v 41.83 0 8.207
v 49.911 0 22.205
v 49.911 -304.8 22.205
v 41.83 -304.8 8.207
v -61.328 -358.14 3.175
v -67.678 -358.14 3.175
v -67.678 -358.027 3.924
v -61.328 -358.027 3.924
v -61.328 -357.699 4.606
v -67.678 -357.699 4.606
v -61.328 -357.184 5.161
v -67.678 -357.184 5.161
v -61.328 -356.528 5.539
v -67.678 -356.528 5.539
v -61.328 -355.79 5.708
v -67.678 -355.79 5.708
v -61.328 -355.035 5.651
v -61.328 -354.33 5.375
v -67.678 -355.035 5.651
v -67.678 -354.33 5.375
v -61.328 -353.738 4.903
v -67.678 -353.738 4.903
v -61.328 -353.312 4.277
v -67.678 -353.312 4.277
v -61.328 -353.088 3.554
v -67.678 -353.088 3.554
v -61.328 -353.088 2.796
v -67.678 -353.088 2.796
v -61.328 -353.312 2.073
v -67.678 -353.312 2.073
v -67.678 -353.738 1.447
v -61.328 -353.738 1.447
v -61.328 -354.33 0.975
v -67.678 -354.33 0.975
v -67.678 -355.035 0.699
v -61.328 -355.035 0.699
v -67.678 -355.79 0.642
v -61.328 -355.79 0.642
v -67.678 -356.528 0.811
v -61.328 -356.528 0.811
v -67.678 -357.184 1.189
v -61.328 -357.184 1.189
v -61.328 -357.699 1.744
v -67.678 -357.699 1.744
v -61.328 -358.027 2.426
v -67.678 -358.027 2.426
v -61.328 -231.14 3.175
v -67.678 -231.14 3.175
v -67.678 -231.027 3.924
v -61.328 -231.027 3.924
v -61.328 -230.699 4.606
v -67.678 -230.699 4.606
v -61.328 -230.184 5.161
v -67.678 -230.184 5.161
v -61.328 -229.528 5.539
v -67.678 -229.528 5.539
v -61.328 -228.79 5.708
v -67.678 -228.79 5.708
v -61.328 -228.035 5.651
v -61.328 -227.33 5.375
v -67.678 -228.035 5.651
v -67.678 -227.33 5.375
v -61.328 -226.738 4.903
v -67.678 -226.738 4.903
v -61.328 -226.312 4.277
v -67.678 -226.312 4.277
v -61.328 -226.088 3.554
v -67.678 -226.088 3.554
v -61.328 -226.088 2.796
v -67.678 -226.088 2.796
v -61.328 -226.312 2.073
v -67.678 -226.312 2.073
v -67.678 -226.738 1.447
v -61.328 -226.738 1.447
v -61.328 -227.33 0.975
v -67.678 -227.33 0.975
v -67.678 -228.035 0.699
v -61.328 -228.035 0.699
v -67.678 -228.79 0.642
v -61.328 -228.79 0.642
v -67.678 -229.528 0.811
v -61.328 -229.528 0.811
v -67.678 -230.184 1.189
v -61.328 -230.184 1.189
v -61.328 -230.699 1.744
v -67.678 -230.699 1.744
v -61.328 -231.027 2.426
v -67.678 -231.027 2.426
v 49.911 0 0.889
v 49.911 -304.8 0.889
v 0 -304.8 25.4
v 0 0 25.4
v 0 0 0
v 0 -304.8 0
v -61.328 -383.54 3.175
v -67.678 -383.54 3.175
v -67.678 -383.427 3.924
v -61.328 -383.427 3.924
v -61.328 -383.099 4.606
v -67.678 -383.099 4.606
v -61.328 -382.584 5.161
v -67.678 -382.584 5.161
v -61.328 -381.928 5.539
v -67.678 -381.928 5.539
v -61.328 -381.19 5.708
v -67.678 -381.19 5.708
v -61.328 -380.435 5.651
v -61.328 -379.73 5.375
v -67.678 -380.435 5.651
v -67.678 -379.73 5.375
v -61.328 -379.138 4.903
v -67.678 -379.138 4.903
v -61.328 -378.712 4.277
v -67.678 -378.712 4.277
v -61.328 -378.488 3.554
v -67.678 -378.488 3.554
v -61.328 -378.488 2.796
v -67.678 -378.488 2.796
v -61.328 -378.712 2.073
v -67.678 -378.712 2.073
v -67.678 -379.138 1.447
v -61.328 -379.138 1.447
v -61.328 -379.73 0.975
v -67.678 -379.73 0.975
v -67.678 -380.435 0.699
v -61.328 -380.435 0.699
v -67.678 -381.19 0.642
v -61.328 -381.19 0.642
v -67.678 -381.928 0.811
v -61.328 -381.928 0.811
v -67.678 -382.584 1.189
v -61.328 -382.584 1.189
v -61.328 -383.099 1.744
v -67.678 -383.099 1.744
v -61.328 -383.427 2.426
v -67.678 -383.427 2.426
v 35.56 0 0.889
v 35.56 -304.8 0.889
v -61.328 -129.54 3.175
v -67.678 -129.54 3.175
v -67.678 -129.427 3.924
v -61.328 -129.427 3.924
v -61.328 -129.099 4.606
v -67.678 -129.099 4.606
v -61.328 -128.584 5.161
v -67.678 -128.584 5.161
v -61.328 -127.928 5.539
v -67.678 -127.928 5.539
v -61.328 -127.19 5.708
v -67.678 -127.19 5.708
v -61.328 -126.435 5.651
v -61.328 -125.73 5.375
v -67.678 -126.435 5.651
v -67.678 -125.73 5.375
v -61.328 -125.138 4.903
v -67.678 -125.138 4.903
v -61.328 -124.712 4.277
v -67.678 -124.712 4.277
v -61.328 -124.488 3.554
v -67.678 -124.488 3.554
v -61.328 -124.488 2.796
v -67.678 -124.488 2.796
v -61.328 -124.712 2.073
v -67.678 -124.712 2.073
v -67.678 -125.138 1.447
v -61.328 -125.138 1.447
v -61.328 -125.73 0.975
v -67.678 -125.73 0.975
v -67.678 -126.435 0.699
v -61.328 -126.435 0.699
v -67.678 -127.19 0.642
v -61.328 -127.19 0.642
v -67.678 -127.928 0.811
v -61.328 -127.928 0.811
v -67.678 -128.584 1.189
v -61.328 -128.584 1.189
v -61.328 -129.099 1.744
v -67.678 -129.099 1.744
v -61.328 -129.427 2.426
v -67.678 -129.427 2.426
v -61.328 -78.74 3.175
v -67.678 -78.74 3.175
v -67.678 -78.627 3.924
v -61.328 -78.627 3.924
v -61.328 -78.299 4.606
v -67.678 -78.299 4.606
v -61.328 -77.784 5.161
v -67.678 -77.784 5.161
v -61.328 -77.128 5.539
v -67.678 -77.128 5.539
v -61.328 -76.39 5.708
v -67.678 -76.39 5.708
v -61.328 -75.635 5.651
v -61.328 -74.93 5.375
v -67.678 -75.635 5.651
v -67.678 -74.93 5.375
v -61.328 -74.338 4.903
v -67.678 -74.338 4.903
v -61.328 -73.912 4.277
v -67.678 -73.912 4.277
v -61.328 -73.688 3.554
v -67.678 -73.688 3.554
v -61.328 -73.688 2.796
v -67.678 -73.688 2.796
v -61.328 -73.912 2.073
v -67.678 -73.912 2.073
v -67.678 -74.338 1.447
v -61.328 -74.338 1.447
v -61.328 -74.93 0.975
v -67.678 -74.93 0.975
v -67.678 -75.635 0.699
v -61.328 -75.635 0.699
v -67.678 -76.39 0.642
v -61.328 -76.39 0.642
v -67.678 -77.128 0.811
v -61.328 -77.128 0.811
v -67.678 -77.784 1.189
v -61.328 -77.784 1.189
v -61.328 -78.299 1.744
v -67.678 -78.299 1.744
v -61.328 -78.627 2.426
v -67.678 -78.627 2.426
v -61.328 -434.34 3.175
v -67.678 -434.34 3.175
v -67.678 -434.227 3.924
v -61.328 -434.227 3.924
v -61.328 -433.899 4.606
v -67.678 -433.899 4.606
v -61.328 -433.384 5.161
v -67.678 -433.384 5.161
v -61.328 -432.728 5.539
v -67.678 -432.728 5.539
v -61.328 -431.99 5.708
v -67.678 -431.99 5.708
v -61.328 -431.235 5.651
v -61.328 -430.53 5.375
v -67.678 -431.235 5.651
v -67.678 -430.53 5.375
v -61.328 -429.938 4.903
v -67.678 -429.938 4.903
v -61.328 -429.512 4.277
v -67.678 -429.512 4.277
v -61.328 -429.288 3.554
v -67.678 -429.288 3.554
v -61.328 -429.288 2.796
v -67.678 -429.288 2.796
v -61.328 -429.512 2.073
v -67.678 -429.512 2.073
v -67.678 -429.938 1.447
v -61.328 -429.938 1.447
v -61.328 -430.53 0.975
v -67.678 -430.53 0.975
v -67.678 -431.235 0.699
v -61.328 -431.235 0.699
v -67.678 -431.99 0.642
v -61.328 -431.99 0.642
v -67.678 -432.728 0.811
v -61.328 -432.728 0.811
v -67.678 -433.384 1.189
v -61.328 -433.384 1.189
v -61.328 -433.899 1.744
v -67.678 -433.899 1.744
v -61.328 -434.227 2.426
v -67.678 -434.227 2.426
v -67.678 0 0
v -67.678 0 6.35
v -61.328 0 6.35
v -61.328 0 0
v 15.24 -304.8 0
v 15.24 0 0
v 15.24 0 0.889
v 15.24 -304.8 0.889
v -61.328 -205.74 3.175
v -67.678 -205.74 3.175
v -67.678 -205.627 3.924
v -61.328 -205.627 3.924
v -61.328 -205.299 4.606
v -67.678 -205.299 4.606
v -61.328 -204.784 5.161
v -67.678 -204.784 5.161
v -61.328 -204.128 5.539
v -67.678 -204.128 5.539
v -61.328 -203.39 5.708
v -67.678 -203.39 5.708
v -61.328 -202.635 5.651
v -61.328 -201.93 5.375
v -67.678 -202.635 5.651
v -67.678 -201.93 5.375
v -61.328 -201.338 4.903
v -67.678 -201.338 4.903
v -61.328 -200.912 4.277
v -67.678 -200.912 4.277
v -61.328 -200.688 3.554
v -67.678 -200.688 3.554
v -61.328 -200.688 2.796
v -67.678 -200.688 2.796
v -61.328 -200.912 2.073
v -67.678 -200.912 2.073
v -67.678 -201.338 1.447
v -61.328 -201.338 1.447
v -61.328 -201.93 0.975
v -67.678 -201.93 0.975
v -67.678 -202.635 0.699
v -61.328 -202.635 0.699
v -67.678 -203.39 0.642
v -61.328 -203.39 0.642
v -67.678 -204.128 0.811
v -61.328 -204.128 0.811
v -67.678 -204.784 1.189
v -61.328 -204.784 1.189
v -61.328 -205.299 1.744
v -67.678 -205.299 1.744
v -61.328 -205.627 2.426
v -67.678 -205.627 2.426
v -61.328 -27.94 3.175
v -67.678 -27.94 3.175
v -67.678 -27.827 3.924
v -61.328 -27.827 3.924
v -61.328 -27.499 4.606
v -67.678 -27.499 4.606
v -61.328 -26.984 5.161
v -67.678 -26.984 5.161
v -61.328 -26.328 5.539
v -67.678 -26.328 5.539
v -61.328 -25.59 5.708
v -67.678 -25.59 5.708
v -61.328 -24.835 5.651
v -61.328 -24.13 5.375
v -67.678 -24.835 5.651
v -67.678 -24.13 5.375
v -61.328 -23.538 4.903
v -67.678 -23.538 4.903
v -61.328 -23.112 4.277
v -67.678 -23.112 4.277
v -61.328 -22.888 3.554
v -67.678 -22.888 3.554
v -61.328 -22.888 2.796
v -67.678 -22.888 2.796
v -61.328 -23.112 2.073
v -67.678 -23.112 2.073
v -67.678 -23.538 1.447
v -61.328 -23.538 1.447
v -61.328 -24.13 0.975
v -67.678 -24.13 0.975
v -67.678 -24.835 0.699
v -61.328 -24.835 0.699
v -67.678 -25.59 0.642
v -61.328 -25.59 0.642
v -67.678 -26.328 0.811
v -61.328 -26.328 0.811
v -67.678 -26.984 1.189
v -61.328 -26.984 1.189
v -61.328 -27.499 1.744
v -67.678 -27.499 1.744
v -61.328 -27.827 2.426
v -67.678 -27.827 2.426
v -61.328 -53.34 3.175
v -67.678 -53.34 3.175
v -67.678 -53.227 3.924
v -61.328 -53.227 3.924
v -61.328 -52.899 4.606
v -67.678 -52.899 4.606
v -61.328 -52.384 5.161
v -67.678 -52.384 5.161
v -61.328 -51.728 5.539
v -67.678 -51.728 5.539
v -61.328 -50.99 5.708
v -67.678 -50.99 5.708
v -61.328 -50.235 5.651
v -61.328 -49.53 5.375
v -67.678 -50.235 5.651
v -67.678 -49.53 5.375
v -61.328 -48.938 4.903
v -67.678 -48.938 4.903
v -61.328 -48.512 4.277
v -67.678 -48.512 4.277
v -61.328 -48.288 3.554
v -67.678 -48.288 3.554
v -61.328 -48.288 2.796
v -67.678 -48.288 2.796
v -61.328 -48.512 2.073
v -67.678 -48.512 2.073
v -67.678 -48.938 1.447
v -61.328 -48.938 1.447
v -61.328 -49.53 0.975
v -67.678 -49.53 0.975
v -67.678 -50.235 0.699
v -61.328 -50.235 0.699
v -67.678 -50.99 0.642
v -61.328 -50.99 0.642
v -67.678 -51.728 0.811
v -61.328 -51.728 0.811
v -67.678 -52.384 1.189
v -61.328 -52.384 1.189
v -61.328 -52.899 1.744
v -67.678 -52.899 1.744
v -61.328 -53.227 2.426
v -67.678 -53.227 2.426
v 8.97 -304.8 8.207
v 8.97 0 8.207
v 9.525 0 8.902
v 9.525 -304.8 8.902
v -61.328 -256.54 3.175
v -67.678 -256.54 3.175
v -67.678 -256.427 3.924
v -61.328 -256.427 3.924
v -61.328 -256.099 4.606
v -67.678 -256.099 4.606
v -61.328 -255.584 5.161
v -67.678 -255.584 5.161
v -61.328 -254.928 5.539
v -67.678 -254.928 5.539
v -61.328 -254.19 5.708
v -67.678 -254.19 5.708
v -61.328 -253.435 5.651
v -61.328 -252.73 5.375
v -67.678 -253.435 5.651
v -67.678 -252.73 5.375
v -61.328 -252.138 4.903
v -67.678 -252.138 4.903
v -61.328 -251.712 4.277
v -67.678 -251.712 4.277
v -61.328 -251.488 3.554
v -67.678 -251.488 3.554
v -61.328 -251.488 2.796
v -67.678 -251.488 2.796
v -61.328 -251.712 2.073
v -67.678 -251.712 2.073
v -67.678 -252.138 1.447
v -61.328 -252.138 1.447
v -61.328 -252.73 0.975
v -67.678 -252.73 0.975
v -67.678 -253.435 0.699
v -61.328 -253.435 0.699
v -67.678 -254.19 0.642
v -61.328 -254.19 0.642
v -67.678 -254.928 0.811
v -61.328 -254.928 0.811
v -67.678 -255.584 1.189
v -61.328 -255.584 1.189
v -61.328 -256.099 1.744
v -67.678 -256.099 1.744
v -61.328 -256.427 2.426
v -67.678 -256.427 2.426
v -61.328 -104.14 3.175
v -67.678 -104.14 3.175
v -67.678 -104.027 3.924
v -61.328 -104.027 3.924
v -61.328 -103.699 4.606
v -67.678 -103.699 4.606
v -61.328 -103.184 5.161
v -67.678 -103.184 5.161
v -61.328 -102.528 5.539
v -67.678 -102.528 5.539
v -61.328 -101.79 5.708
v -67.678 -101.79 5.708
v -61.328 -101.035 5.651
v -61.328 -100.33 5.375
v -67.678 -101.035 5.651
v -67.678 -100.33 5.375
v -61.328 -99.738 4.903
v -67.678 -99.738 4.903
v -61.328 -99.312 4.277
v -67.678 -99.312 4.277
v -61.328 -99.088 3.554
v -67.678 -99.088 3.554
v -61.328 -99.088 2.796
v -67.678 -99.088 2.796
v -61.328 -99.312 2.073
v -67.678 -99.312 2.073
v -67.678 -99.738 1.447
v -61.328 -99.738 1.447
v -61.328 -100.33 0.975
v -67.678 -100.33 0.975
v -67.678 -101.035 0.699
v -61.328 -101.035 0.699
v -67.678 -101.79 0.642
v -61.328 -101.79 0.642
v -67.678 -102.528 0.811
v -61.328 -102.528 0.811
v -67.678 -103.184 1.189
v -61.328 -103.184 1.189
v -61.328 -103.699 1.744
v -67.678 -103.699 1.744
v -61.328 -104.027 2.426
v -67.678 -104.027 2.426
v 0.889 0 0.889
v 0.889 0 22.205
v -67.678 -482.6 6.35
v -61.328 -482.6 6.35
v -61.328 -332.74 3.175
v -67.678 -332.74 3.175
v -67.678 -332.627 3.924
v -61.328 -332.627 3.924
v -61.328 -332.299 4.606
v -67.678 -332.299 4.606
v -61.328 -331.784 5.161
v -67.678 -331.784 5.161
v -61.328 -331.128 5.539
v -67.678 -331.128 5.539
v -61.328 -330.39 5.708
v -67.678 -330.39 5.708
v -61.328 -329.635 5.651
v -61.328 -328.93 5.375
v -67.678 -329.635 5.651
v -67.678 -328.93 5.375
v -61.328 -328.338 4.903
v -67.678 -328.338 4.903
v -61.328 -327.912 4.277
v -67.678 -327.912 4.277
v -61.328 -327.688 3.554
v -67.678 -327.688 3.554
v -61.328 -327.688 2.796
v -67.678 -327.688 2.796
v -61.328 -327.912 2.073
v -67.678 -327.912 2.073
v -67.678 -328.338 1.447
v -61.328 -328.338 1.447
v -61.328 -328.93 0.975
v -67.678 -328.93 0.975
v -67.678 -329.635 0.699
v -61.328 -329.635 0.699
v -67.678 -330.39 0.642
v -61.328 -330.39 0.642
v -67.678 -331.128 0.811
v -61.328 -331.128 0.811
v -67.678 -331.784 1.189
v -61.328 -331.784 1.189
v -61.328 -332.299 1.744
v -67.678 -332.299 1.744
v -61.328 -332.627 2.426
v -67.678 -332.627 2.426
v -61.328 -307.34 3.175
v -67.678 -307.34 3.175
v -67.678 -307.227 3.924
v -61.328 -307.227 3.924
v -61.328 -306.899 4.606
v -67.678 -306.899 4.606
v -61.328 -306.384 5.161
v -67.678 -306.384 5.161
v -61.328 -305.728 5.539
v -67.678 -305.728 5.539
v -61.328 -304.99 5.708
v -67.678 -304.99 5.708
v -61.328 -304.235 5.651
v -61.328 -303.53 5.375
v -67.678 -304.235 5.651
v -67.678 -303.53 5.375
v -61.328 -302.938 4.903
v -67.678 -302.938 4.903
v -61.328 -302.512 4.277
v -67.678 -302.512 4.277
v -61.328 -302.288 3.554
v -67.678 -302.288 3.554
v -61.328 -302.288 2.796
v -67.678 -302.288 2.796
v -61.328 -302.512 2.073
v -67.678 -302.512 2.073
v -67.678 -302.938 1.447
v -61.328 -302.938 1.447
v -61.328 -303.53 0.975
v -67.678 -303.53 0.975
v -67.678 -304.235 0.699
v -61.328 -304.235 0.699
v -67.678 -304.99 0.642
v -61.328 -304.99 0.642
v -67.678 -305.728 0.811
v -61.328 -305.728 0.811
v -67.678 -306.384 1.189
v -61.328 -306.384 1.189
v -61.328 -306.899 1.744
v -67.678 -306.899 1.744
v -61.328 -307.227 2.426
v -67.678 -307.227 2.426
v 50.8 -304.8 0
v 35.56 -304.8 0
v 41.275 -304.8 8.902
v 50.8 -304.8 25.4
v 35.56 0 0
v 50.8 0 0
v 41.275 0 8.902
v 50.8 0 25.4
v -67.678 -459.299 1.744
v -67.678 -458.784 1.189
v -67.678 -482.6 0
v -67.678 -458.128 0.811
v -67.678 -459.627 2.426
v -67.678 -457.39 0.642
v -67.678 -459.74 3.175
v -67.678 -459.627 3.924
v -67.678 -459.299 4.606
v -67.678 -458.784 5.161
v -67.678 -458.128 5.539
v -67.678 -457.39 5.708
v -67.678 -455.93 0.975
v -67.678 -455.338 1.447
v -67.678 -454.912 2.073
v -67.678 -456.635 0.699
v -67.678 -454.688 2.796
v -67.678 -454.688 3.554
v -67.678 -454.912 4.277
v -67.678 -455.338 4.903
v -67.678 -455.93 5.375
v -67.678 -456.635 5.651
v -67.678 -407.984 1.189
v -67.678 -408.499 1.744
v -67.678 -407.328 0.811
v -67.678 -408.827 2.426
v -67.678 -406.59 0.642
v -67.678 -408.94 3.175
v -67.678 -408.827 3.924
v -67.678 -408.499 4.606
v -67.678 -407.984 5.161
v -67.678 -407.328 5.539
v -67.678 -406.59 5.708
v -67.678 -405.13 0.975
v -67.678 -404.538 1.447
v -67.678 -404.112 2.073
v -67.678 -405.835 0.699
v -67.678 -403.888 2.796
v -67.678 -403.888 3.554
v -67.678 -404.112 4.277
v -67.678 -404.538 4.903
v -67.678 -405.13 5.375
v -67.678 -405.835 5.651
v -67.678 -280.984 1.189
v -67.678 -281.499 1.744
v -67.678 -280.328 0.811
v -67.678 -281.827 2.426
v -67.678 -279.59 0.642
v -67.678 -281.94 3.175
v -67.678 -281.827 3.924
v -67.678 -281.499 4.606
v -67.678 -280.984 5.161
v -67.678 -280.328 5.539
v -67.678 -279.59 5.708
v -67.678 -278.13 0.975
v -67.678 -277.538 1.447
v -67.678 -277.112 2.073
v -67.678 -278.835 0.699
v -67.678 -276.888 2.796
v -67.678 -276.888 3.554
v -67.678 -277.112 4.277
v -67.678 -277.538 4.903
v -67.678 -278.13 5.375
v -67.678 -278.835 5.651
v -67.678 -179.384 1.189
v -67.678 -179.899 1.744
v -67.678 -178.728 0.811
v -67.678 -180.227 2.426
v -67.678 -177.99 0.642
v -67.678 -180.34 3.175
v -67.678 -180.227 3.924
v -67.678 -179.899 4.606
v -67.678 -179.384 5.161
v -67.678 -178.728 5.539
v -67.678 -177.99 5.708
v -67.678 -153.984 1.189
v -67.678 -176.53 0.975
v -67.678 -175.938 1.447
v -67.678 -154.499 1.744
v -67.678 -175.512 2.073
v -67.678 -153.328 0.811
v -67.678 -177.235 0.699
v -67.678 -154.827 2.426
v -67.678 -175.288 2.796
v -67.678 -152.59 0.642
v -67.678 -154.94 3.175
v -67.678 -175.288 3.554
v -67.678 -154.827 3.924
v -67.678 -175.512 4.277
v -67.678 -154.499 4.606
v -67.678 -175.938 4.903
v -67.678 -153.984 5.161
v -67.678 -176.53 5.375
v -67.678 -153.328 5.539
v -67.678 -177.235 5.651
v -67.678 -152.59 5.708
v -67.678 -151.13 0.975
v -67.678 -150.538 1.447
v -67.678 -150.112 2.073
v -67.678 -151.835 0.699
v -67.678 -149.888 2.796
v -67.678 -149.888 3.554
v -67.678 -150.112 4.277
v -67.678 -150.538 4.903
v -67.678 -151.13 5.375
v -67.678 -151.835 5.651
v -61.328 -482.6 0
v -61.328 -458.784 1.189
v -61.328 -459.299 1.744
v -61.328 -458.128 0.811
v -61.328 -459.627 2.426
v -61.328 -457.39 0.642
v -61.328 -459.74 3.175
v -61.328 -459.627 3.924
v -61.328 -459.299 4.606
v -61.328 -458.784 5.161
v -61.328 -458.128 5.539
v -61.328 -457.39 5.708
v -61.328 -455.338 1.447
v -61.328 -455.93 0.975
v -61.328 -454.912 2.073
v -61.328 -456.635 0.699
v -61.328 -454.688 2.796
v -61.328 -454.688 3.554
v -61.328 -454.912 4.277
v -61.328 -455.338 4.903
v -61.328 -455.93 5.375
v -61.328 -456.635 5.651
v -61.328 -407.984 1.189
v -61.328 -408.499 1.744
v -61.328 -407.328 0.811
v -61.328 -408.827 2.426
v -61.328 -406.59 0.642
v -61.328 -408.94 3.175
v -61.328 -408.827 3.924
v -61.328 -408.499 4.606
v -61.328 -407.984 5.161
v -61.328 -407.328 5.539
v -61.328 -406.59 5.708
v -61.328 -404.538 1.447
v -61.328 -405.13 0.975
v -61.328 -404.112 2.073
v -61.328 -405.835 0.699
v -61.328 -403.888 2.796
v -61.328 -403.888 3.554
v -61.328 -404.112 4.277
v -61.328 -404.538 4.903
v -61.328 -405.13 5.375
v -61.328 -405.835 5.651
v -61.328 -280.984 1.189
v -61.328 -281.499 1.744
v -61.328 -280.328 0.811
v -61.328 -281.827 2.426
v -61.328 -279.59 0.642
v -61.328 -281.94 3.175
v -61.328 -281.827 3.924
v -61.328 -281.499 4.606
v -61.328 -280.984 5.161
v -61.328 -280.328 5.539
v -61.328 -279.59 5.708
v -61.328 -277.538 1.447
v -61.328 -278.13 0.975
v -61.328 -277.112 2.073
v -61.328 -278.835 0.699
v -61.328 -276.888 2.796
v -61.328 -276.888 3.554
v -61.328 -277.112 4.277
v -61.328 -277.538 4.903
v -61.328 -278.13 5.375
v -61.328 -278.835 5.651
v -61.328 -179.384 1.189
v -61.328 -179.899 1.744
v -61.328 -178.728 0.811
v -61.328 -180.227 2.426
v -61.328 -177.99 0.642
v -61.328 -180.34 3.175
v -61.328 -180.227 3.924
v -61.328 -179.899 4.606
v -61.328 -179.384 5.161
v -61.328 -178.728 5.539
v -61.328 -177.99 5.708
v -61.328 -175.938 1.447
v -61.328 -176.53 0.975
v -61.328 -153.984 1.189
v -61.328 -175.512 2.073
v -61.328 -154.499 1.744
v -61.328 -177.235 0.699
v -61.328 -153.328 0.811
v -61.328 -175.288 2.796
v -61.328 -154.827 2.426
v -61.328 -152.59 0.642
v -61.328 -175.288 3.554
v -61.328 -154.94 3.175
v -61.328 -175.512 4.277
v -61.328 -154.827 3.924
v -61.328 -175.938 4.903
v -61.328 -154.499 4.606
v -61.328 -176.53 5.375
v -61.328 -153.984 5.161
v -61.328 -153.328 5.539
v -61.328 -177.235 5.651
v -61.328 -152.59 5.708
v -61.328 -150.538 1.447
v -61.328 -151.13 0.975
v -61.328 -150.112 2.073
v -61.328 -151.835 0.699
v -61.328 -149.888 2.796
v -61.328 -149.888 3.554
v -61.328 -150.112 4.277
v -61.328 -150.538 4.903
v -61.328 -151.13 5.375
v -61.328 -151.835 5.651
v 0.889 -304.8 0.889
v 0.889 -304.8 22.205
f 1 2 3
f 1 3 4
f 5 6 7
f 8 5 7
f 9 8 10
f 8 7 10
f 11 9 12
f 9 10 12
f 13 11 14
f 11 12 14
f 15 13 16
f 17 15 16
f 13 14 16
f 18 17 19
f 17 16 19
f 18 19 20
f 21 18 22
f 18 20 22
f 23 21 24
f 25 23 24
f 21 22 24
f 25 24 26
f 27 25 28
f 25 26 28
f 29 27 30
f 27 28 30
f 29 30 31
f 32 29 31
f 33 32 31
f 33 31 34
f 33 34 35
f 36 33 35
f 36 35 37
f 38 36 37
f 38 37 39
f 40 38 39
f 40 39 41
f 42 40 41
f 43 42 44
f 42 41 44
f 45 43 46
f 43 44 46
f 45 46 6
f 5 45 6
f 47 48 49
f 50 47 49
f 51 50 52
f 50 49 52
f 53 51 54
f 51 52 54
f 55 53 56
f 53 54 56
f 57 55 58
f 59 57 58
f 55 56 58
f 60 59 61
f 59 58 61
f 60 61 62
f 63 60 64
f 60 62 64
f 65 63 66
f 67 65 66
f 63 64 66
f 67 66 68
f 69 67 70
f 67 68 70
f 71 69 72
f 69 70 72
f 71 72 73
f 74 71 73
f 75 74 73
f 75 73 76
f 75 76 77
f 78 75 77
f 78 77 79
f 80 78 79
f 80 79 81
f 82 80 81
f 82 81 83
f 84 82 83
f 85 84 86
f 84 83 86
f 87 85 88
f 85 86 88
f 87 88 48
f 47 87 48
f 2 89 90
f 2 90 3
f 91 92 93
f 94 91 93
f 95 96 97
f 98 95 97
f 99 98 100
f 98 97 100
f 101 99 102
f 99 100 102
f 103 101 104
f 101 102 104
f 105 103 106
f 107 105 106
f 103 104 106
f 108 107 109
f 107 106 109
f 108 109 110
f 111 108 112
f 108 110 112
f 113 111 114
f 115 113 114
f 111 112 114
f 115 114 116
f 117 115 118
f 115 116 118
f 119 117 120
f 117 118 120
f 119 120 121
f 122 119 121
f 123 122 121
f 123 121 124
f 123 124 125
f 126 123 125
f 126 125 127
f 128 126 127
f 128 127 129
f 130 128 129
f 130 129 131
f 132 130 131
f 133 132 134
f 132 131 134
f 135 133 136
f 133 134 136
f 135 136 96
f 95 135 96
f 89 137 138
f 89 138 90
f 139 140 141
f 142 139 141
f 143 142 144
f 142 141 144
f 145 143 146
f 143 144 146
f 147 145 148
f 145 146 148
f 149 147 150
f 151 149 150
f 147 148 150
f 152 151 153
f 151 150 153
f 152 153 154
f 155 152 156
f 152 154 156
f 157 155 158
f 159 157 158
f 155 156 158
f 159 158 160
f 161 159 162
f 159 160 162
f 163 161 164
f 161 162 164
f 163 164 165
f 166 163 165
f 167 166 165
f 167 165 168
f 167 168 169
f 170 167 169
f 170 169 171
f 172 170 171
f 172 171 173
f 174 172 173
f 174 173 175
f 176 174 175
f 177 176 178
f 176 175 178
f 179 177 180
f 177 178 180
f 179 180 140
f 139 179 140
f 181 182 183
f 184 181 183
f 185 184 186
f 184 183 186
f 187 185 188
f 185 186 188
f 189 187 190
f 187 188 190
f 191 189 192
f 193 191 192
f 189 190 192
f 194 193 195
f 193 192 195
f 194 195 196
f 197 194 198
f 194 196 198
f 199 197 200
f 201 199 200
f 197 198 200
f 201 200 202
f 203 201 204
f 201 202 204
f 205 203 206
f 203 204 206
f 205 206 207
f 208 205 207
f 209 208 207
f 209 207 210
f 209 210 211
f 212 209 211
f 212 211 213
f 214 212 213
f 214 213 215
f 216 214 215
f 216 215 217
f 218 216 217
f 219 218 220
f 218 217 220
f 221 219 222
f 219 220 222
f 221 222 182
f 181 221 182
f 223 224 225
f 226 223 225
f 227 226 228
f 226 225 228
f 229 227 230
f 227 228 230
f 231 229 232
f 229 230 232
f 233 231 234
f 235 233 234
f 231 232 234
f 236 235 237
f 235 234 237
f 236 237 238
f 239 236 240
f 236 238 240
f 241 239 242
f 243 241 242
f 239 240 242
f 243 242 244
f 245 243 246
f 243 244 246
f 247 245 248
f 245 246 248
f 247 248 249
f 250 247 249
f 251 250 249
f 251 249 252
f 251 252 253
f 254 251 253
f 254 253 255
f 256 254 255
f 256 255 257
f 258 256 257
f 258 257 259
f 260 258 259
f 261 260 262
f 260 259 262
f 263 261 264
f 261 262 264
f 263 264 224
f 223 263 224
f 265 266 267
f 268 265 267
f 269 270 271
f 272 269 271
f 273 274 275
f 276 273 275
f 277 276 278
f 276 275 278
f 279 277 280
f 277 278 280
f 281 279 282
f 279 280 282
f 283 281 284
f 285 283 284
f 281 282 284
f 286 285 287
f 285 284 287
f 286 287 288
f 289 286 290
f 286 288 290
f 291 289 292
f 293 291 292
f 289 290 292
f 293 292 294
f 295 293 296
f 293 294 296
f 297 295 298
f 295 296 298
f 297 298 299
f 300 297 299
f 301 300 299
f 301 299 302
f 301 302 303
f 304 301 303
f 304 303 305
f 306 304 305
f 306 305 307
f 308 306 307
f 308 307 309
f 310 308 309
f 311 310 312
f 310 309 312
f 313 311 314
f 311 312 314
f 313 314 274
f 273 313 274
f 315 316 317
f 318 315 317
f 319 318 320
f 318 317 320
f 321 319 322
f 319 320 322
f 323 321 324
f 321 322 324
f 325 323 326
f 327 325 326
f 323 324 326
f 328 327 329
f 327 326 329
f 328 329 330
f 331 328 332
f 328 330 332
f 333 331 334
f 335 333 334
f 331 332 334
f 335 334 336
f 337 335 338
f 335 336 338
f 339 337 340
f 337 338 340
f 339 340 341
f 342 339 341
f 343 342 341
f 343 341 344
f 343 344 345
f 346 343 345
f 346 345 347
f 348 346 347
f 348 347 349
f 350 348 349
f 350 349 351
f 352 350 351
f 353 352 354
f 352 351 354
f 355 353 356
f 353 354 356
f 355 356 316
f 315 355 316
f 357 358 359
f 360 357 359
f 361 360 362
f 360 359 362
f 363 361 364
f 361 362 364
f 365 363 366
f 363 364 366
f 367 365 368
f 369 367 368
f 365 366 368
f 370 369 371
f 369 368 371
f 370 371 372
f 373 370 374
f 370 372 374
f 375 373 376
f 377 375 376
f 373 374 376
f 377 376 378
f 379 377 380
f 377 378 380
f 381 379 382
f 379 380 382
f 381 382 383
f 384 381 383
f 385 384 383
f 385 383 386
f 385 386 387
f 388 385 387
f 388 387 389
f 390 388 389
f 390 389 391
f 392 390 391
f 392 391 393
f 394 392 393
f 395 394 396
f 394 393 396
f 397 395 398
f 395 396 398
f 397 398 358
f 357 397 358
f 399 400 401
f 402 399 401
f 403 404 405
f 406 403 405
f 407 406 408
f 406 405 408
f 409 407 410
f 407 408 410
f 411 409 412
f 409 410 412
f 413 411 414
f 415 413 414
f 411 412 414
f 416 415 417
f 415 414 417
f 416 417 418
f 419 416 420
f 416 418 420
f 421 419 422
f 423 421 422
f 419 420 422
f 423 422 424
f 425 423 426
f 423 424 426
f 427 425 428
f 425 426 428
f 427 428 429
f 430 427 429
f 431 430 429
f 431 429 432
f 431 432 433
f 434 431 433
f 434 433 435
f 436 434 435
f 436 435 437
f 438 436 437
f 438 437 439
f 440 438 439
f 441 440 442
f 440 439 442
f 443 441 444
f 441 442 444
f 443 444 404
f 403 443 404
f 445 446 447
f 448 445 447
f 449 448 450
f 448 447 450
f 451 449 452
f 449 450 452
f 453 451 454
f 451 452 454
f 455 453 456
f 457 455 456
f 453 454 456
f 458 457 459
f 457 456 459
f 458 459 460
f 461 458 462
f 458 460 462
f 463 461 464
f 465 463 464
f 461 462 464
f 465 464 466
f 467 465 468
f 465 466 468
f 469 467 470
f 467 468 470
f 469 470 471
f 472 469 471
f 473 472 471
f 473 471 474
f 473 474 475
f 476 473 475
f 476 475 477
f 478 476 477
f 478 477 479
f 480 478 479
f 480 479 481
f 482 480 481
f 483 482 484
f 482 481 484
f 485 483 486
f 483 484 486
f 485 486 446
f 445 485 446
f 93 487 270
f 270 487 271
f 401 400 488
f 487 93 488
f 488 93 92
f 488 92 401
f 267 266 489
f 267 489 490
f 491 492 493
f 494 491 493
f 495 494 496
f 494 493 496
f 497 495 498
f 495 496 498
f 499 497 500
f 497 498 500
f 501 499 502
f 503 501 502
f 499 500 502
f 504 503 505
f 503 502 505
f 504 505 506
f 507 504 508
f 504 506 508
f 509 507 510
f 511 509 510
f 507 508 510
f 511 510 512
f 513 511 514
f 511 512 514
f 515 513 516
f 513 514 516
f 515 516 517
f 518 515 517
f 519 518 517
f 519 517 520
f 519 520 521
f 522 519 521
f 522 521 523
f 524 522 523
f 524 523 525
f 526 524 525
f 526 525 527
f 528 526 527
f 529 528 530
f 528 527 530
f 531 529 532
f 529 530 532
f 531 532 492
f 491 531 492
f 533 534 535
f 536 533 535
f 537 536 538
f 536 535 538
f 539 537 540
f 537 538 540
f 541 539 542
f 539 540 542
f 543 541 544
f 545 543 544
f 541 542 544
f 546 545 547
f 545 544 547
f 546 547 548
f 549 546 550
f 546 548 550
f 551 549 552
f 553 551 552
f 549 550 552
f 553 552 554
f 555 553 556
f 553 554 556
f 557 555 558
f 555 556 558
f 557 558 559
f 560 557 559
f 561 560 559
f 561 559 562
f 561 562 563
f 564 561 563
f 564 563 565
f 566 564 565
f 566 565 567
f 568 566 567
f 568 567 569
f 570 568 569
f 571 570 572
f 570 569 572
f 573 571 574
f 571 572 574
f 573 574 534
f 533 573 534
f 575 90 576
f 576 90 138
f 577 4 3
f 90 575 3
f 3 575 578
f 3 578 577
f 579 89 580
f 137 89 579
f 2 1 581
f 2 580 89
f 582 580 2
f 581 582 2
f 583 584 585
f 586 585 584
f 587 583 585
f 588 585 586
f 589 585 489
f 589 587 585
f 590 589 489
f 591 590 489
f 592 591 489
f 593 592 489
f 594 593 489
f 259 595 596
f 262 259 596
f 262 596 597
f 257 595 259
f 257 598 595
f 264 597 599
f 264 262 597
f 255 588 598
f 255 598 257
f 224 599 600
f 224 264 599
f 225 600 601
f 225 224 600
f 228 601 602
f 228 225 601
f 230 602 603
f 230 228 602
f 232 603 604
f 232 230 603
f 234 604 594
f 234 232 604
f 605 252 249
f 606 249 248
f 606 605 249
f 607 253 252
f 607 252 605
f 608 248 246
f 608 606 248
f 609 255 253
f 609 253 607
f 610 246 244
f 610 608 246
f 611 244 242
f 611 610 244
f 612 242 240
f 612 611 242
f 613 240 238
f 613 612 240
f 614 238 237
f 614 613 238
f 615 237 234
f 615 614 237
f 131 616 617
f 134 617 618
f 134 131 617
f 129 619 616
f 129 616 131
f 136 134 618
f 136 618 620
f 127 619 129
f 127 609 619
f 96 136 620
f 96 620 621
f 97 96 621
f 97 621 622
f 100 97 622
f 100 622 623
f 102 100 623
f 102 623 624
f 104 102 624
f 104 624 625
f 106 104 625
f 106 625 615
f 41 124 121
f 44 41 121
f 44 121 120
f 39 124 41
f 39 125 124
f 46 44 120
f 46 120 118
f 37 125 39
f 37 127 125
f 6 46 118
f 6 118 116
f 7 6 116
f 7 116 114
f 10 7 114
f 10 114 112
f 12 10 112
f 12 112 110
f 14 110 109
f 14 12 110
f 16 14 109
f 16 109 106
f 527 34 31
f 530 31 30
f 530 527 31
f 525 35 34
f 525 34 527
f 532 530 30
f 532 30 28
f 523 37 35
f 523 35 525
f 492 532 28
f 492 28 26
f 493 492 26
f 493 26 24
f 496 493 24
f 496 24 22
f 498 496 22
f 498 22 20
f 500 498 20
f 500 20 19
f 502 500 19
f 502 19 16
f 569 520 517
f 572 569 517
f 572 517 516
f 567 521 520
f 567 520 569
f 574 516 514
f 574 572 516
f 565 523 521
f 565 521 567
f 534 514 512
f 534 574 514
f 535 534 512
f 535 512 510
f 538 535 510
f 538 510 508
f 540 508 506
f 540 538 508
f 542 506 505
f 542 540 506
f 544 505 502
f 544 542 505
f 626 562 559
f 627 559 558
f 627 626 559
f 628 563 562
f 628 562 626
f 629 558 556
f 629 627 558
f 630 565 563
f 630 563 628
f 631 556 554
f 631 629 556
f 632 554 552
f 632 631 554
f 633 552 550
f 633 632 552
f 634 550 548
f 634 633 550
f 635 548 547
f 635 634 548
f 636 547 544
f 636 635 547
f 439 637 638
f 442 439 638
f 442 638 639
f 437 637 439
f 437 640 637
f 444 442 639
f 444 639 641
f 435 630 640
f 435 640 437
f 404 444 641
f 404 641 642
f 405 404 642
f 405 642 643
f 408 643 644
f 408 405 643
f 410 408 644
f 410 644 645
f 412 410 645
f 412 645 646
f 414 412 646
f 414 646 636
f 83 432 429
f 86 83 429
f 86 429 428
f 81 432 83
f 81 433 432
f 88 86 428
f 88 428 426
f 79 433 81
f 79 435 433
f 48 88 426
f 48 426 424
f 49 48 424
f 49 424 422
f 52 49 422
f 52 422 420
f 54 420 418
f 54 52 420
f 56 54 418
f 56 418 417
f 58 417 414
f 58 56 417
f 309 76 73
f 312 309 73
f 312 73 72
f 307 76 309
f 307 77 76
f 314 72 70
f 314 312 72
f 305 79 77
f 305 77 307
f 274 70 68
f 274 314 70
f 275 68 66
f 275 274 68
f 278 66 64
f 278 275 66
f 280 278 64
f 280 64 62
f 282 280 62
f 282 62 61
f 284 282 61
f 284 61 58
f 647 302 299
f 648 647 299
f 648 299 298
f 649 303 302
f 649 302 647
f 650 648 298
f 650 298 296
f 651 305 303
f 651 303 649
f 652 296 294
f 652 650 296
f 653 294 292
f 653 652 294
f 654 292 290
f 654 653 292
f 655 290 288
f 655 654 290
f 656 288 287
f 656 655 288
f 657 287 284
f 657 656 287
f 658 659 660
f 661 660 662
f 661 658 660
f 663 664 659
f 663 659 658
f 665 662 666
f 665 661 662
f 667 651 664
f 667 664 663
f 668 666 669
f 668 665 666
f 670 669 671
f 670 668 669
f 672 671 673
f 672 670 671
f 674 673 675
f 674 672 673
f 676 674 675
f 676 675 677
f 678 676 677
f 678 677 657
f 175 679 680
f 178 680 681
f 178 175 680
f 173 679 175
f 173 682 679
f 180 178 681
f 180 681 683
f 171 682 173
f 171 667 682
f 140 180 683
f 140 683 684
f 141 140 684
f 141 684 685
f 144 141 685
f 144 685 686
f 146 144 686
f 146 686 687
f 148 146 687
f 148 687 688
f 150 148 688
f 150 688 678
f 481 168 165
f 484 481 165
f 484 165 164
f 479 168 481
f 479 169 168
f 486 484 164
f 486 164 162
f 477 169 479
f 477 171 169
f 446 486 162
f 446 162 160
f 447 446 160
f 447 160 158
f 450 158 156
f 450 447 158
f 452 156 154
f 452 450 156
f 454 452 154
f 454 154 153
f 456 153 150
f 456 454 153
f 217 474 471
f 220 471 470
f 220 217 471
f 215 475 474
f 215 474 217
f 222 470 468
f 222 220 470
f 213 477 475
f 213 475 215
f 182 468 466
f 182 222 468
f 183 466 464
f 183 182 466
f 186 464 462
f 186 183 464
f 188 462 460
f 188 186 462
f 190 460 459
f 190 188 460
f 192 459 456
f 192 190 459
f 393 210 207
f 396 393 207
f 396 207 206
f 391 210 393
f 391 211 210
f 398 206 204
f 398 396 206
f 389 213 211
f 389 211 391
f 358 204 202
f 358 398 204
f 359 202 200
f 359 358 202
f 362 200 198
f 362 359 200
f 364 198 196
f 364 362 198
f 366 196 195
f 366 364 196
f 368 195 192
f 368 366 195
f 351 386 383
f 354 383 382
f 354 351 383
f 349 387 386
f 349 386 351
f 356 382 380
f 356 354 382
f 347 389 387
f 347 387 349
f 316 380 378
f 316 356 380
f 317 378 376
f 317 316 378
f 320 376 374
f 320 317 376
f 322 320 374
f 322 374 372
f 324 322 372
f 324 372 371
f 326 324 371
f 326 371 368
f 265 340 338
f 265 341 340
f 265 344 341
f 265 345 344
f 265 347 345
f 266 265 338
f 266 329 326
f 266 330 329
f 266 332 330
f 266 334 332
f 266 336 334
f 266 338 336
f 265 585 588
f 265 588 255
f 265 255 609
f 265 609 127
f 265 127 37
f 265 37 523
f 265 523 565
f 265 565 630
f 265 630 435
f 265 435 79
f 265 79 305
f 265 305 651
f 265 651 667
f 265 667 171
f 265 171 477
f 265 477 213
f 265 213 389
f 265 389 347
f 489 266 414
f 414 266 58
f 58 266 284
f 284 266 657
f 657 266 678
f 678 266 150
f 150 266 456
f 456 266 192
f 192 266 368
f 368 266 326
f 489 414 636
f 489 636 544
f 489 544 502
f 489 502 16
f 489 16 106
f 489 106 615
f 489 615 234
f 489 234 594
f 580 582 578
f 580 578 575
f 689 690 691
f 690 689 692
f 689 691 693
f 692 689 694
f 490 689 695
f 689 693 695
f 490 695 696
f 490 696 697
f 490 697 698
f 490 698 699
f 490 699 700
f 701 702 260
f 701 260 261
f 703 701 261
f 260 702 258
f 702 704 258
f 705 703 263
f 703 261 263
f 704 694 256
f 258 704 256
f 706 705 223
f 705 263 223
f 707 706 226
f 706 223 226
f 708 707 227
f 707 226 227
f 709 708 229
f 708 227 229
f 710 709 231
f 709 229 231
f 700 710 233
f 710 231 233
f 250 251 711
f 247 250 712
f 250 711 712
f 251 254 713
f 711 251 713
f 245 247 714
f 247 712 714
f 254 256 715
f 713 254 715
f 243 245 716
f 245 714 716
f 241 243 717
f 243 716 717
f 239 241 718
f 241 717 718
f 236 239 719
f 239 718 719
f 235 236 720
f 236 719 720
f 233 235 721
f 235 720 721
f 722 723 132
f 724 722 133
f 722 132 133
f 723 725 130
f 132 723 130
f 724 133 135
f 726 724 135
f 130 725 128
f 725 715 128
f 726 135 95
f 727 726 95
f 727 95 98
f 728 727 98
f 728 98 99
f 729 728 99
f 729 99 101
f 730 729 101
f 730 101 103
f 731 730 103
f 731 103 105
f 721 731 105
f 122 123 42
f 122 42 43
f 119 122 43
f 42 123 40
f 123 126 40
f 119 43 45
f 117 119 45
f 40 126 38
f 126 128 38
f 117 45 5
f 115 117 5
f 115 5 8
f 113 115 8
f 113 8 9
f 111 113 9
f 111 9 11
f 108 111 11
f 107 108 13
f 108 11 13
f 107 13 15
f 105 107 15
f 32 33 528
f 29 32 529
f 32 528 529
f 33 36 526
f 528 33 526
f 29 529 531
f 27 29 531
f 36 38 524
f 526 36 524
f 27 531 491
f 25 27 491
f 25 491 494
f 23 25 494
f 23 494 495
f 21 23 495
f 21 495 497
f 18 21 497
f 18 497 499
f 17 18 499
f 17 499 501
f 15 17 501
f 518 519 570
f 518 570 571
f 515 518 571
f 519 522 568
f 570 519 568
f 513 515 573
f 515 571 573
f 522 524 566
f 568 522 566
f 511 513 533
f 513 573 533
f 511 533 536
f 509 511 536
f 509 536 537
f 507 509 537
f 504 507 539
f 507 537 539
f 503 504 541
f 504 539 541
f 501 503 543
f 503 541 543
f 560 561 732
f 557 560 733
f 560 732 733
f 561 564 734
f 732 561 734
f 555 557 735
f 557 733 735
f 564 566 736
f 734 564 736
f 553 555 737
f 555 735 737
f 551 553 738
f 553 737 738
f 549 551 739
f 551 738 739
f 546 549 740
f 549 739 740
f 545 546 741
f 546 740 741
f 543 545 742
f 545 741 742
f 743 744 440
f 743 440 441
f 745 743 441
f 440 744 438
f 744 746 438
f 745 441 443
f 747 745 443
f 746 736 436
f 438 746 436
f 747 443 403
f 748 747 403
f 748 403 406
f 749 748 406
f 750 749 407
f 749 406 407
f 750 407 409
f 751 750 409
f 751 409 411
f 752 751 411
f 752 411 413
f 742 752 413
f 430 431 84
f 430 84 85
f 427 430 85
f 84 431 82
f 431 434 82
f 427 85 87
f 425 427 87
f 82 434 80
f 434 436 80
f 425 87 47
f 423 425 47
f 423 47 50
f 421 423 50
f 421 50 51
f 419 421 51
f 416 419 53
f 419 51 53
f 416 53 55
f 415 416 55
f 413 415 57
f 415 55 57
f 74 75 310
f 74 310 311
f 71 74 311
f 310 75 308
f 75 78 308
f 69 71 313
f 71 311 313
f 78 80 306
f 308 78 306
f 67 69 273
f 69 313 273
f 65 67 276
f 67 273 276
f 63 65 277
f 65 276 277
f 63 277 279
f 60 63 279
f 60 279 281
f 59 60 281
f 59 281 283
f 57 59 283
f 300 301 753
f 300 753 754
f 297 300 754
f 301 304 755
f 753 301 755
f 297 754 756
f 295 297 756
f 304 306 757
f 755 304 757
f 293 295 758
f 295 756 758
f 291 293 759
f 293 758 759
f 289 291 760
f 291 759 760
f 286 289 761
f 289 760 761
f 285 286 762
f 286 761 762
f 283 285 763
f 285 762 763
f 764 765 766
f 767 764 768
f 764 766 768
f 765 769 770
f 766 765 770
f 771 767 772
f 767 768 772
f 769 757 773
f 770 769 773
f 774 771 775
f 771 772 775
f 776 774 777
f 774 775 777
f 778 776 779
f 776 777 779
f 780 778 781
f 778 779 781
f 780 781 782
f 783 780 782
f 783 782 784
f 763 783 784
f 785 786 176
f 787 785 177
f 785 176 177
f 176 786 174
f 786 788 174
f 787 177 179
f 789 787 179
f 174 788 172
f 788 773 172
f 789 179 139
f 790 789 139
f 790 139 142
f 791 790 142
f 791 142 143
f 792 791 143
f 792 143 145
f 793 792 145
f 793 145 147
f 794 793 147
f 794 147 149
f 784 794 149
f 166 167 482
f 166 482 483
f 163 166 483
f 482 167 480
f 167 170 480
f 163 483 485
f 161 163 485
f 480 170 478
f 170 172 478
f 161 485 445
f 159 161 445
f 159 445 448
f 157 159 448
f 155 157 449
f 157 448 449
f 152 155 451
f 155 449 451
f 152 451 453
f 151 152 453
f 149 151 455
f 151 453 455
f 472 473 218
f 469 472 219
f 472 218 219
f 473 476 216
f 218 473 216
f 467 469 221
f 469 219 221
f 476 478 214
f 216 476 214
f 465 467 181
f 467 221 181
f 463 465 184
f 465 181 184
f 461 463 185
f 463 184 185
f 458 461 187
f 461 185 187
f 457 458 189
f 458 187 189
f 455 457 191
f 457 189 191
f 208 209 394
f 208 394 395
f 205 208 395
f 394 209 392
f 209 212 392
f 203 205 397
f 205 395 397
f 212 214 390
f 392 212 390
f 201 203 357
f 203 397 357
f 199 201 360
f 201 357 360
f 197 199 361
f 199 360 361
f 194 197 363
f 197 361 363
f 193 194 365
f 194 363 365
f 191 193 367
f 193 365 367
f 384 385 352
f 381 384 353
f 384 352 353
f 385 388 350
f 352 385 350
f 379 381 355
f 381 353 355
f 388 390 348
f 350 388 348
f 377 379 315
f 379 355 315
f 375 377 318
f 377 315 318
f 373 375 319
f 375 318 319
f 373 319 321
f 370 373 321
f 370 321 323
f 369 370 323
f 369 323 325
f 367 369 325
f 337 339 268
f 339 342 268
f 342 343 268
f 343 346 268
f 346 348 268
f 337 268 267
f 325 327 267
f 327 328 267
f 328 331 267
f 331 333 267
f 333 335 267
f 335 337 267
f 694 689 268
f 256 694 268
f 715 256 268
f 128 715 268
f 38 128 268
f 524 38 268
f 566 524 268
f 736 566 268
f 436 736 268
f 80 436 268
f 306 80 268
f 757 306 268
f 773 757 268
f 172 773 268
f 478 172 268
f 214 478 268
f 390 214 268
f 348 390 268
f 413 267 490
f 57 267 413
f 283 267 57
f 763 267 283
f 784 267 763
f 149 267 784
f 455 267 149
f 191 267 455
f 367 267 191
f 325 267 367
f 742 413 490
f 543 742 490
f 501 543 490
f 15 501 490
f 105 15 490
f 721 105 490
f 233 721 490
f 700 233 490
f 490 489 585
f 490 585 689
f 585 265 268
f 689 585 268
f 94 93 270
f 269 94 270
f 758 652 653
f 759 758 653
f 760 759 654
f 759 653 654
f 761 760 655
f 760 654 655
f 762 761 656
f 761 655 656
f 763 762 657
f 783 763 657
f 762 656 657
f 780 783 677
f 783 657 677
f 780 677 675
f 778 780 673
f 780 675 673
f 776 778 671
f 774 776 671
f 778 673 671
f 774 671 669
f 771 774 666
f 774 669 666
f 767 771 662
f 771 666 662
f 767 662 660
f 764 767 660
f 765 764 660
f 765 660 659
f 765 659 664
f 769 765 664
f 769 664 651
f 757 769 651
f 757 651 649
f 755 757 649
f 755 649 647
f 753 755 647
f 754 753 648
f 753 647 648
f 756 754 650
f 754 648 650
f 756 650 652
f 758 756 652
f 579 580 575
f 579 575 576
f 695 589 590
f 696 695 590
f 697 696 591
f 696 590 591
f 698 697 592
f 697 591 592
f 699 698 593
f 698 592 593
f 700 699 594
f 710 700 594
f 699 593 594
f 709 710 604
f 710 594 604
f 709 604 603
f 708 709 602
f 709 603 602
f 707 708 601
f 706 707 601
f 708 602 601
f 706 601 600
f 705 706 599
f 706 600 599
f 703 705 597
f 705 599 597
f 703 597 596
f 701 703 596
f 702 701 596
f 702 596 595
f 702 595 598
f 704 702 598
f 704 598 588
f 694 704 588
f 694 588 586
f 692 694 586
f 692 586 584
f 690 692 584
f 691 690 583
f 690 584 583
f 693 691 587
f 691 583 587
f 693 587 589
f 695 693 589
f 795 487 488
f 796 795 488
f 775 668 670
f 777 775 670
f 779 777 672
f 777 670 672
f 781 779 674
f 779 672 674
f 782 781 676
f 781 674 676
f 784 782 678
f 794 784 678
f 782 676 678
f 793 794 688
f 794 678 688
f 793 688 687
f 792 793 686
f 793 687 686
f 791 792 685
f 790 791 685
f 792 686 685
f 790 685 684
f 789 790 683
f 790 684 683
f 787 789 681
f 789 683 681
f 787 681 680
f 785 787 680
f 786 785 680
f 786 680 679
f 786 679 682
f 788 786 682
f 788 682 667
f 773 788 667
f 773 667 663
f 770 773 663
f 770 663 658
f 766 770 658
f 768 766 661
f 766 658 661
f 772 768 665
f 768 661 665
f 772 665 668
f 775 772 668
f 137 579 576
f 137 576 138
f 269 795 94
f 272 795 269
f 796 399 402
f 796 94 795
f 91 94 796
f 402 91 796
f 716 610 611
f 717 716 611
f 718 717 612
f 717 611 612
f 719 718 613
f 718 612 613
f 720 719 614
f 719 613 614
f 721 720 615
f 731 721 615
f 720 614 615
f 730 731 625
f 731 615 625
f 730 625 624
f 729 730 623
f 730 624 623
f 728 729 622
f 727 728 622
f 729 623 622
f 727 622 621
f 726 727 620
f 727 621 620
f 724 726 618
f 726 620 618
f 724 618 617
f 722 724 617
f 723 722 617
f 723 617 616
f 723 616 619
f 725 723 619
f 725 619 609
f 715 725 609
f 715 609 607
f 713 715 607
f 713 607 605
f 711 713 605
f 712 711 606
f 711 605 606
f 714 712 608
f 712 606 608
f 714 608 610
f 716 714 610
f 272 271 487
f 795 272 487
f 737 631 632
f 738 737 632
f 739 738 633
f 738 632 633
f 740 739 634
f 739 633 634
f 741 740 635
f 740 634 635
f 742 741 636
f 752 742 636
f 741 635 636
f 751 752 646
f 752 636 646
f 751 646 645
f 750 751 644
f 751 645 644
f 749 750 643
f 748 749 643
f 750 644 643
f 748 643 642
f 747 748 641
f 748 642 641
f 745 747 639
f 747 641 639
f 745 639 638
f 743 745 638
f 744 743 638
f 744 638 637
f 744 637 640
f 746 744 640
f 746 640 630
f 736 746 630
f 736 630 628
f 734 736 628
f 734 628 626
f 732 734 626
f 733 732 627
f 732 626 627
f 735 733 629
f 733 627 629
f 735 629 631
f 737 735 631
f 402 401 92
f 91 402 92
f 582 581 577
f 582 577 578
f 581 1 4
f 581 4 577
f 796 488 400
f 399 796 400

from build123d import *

# Parameters (mm, degrees)
F1_DEPTH = 304.8
F2_W     = 6.35
F2_H     = 6.35
F3_DEPTH = 482.6
F4_R     = 2.54
F5_DEPTH = 6.35


with BuildPart() as f1:
    # F0 (on Front) → F1 (new body)
    with BuildSketch(Plane.XZ):
        Polygon((0, 25.4), (0, 0), (15.24, 0), (15.24, 0.889), (0.889, 0.889), (0.889, 22.204766), (8.970346, 8.207464), (9.525, 8.902216), align=None)
    extrude(amount=F1_DEPTH)


with BuildPart() as f3:
    # F2 (on Front) → F3 (new body)
    with BuildSketch(Plane.XZ):
        with Locations((-64.502652, 3.175)):
            Rectangle(F2_W, F2_H)
    extrude(amount=F3_DEPTH)

    # F4 (on face) → F5 (cut)
    with BuildSketch(Plane(origin=(-67.677652, 0, 0), x_dir=(0, -1, 0), z_dir=(-1, 0, 0))):
        with Locations((25.4, 3.175)):
            Circle(F4_R)
        with Locations((50.8, 3.175)):
            Circle(F4_R)
        with Locations((76.2, 3.175)):
            Circle(F4_R)
        with Locations((101.6, 3.175)):
            Circle(F4_R)
        with Locations((127, 3.175)):
            Circle(F4_R)
        with Locations((152.4, 3.175)):
            Circle(F4_R)
        with Locations((177.8, 3.175)):
            Circle(F4_R)
        with Locations((203.2, 3.175)):
            Circle(F4_R)
        with Locations((228.6, 3.175)):
            Circle(F4_R)
        with Locations((254, 3.175)):
            Circle(F4_R)
        with Locations((279.4, 3.175)):
            Circle(F4_R)
        with Locations((304.8, 3.175)):
            Circle(F4_R)
        with Locations((330.2, 3.175)):
            Circle(F4_R)
        with Locations((355.6, 3.175)):
            Circle(F4_R)
        with Locations((381, 3.175)):
            Circle(F4_R)
        with Locations((406.4, 3.175)):
            Circle(F4_R)
        with Locations((431.8, 3.175)):
            Circle(F4_R)
        with Locations((457.2, 3.175)):
            Circle(F4_R)
    extrude(amount=-F5_DEPTH, mode=Mode.SUBTRACT)


with BuildPart() as f7_1:
    # F7: instance of F1
    add(f1.part.mirror(Plane.YZ.offset(25.4)))


solid = Compound([f1.part, f3.part, f7_1.part])
